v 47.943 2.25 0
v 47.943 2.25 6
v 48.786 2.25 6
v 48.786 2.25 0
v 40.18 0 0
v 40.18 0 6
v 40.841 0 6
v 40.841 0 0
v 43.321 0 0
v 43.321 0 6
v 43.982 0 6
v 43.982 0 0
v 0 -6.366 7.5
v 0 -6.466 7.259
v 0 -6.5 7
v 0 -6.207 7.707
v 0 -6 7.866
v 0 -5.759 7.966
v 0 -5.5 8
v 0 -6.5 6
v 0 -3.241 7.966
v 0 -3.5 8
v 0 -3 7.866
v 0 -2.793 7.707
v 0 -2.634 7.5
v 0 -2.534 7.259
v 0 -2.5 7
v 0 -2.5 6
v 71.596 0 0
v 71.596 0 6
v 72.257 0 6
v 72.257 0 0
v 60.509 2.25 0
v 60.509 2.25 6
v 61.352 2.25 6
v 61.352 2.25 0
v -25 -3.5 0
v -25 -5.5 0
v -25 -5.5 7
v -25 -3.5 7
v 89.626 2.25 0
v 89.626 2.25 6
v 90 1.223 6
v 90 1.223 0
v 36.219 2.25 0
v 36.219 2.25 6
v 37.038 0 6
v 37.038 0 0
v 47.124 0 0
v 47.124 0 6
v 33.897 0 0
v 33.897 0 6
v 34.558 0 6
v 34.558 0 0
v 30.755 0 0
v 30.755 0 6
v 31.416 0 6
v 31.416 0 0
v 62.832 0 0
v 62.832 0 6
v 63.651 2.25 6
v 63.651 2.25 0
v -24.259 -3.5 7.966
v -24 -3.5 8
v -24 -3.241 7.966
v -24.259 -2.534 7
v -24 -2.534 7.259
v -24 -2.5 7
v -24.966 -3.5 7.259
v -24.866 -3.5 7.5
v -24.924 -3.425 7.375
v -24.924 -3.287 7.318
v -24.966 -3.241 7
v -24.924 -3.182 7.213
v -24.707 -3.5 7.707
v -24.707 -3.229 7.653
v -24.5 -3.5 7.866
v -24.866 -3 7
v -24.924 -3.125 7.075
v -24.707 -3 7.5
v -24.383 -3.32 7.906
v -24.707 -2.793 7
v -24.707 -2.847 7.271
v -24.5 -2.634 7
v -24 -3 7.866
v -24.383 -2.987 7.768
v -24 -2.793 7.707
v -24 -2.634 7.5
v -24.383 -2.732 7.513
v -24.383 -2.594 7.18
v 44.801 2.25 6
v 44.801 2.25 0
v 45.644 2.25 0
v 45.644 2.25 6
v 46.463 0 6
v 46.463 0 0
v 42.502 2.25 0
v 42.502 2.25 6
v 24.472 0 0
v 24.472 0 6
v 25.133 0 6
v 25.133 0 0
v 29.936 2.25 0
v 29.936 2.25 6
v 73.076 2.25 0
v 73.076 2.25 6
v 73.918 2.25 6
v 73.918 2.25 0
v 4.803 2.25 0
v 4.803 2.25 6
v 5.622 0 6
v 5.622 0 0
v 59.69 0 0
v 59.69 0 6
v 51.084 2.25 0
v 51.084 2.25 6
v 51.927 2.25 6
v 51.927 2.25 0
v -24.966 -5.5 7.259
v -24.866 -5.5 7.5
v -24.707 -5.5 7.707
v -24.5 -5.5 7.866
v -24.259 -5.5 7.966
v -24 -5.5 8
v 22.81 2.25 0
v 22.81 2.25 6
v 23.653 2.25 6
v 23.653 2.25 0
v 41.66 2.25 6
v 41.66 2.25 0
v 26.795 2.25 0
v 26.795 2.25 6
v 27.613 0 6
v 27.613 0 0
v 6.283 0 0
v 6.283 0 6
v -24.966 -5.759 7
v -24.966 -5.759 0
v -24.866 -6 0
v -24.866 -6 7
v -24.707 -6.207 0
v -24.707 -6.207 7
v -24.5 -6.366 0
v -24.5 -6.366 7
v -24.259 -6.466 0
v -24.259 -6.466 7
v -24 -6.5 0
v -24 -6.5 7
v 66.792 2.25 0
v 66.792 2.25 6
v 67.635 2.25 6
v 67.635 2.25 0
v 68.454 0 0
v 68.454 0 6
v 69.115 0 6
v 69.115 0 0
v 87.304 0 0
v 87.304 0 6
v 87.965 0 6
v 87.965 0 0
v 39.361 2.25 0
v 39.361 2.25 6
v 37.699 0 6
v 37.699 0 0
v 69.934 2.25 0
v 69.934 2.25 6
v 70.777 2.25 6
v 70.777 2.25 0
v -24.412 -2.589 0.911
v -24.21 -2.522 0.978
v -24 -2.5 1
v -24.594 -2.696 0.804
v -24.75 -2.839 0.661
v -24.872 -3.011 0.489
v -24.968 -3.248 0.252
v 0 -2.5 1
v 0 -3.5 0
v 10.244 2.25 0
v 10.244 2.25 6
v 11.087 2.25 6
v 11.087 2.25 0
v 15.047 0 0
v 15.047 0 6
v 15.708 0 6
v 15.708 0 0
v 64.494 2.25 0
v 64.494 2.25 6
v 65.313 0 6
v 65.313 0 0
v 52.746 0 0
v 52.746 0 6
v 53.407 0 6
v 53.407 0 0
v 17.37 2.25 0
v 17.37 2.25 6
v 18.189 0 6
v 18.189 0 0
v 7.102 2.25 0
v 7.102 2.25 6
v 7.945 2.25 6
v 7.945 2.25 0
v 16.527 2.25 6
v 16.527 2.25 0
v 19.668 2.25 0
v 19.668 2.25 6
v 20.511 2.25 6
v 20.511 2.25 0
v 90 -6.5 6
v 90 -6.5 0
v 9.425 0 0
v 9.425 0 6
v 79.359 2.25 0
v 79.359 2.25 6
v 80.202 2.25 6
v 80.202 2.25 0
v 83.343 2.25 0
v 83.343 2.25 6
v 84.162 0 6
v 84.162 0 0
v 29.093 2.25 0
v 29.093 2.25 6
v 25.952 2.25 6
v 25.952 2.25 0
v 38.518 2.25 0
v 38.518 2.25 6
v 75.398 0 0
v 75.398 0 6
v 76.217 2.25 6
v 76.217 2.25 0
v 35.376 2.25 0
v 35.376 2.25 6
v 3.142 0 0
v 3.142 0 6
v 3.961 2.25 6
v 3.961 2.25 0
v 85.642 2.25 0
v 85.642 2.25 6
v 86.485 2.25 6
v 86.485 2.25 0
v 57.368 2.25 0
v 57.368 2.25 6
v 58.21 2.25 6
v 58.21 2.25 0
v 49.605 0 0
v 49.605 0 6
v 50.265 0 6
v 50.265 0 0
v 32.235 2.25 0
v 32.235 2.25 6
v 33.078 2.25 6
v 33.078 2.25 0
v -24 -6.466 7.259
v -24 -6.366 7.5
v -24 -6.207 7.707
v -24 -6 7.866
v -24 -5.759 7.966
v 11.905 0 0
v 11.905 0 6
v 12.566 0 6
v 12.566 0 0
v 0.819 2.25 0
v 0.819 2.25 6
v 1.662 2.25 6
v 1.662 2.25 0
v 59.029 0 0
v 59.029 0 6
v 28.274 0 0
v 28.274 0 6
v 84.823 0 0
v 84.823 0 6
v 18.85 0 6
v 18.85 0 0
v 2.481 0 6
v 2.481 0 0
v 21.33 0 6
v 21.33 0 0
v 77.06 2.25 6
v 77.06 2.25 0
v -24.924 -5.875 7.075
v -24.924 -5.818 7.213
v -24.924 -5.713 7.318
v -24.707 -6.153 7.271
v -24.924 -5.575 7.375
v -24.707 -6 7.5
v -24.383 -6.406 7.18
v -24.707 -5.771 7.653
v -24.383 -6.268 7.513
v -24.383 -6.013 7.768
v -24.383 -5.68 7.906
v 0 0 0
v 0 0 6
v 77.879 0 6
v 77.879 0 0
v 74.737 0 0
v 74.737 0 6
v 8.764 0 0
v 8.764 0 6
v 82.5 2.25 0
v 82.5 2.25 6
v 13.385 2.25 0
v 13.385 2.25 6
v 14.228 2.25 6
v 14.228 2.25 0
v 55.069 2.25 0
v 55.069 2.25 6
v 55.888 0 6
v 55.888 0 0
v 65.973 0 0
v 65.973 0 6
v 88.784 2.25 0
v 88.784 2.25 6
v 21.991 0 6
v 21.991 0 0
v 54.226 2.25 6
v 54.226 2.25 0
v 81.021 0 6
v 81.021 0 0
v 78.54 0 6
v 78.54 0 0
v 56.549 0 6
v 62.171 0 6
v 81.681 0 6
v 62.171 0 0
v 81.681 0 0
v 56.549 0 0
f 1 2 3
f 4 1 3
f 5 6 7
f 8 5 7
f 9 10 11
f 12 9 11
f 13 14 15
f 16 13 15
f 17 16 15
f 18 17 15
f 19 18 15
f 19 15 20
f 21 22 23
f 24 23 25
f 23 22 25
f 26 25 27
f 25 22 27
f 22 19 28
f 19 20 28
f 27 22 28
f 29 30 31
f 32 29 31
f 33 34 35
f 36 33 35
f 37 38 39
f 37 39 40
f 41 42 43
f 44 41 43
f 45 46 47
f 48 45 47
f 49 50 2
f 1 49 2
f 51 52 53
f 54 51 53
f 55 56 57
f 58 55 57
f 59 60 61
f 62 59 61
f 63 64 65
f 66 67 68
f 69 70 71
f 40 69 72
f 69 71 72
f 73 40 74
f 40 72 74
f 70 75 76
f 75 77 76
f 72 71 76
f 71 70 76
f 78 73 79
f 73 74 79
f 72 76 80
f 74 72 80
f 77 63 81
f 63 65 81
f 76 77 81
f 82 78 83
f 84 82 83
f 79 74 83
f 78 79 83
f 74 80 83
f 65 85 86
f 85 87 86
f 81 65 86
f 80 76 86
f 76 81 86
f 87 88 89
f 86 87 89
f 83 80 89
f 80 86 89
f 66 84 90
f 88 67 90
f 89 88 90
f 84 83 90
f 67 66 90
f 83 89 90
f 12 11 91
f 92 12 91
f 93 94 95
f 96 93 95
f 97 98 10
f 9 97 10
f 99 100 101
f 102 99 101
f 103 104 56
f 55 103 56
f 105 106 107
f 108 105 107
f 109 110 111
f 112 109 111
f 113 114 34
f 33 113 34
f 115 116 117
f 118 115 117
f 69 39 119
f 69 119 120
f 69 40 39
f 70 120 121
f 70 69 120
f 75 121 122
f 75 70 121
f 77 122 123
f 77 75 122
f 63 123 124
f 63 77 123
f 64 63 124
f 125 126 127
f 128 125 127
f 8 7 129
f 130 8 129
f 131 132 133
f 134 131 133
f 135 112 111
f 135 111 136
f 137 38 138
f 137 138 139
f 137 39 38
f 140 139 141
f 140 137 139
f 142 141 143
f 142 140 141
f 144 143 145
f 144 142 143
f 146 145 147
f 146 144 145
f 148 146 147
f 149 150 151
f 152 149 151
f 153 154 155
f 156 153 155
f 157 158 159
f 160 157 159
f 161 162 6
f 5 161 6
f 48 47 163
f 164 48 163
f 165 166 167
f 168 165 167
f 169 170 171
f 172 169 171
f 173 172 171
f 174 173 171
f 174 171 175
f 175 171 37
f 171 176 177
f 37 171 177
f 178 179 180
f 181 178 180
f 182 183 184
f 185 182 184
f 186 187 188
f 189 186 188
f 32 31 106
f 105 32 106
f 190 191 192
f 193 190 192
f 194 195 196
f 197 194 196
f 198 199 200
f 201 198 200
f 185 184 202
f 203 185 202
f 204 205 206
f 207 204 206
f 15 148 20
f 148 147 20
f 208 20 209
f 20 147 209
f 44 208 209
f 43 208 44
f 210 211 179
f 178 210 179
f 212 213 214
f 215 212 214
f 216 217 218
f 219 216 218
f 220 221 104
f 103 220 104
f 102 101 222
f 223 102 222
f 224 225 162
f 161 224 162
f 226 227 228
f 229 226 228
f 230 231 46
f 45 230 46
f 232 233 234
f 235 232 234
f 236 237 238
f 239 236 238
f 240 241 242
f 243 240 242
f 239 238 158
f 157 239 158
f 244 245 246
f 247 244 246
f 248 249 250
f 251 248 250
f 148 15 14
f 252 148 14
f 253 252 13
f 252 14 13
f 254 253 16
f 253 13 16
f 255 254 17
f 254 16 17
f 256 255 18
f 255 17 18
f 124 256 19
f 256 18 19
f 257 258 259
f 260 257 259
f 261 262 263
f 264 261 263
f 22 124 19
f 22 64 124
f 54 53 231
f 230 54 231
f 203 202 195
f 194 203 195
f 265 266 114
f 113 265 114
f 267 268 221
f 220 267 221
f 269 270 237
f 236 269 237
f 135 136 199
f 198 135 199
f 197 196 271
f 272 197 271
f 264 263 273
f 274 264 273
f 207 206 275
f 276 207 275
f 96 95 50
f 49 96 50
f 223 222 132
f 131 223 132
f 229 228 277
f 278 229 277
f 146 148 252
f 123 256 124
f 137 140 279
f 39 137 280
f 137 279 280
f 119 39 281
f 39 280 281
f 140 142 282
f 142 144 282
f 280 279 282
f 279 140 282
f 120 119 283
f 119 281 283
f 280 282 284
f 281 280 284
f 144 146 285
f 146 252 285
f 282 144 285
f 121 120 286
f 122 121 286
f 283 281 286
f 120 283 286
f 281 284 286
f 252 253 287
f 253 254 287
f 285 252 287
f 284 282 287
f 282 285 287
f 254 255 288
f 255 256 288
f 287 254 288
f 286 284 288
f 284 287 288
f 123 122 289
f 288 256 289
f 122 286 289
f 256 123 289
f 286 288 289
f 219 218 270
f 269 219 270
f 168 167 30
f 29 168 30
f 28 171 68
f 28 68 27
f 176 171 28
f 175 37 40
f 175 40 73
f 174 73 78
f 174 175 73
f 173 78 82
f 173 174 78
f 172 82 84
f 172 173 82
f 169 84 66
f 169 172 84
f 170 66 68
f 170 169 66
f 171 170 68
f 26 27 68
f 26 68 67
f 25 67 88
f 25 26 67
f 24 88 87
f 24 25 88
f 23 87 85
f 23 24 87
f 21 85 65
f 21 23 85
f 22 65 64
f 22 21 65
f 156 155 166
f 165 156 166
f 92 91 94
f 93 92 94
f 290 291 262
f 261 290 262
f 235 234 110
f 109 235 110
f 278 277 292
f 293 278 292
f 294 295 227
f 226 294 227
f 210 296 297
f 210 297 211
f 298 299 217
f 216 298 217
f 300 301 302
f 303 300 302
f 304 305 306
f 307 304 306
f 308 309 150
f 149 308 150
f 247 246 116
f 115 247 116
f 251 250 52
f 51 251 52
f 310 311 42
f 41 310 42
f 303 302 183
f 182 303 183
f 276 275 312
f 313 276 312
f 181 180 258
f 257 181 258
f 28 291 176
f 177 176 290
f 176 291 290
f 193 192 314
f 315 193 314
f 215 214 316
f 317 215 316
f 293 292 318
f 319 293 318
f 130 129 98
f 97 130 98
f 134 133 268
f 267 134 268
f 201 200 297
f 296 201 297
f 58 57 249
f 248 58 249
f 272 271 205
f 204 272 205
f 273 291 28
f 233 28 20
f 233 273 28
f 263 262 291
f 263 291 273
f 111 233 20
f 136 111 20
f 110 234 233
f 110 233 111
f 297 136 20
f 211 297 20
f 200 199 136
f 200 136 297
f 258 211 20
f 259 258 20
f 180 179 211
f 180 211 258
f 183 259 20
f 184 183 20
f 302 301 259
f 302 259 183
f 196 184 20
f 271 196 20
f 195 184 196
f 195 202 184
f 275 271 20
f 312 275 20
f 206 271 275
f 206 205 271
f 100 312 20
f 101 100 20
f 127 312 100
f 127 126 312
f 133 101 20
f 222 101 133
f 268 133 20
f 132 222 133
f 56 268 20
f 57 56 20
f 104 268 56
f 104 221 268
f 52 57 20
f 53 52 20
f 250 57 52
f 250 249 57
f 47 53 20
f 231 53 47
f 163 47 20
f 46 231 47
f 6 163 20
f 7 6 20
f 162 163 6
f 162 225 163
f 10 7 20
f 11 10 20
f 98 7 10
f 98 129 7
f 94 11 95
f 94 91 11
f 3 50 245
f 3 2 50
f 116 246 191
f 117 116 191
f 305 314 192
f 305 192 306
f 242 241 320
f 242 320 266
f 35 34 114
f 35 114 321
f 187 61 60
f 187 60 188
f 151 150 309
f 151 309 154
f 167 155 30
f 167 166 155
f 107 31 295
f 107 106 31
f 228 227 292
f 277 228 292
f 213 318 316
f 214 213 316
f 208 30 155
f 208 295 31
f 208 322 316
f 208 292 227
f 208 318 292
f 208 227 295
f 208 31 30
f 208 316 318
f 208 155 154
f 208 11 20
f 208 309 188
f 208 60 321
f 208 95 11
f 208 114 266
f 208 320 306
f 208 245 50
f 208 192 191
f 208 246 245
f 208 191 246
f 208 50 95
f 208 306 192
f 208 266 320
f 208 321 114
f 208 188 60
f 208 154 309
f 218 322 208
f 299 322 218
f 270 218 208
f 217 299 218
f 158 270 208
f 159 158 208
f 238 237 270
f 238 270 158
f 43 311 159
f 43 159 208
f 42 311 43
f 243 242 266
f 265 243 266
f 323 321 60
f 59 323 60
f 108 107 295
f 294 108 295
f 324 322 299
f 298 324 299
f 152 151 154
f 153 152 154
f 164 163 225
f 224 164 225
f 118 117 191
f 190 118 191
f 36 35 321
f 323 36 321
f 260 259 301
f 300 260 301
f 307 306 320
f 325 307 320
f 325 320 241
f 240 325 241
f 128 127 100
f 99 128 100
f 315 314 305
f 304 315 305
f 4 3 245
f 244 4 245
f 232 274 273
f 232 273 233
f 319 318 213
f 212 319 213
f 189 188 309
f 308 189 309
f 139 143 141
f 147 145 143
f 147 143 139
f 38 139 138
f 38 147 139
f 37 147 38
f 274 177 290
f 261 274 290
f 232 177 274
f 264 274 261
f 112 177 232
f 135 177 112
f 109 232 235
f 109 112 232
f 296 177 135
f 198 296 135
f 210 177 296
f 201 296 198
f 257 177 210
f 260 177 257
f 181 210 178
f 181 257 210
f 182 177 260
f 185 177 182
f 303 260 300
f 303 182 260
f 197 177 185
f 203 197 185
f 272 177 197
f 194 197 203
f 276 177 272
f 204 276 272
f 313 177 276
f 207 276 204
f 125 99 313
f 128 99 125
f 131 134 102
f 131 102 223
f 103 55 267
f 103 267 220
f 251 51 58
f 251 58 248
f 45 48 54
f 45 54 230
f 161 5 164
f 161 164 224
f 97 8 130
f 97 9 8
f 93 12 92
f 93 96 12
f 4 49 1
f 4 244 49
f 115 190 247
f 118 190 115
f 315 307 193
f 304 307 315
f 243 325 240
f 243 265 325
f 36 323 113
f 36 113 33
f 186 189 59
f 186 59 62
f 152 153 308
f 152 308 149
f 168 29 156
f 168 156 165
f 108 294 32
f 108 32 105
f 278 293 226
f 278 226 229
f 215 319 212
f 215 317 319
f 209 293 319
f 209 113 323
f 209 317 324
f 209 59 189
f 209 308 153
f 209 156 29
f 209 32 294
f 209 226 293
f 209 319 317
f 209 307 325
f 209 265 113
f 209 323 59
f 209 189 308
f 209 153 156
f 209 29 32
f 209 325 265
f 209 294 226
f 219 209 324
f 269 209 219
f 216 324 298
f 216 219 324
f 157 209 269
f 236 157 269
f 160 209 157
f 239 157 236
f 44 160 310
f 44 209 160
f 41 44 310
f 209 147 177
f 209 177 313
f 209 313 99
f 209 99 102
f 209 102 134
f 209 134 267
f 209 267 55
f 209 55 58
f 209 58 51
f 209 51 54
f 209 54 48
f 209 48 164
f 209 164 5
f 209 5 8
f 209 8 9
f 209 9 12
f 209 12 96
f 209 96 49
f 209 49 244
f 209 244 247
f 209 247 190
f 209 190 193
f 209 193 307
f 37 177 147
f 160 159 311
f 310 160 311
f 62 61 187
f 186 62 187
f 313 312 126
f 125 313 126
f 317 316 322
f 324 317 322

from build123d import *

# Parameters (mm, degrees)
SKETCH_1_W             = 135.088484104
SKETCH_1_H             = 6.5
EXTRUDE_1_DEPTH        = 8
EXTRUDE_2_DEPTH        = 8
PATTERN_LINEAR_1_COUNT = 43
PATTERN_LINEAR_1_PITCH = 3.141592654
SKETCH_3_OUTSIDE_W     = 164.21
SKETCH_3_OUTSIDE_H     = 37.872
SKETCH_3_OUTSIDE_W_2   = 90
SKETCH_3_OUTSIDE_H_2   = 28.626420759
CUT_EXTRUDE_1_DEPTH    = 26
SKETCH_4_W             = 8
SKETCH_4_H             = 4
EXTRUDE_1_2_DEPTH      = 115
CUT_EXTRUDE_2_DEPTH    = 2
SKETCH_7_W             = 25
SKETCH_7_H             = 4
EXTRUDE_3_DEPTH        = 2
FILLET_1_R             = 1
FILLET_2_R             = 1
CHAMFER_1_SIZE         = 1


with BuildPart() as part:
    # 草图1 → Extrude 1 (new body)
    with BuildSketch(Plane.XY):
        with Locations((67.544242052, -3.25)):
            Rectangle(SKETCH_1_W, SKETCH_1_H)
    extrude(amount=EXTRUDE_1_DEPTH)

    # 草图2 → Extrude 2 (add)
    with BuildSketch(Plane.XY.offset(8)):
        Polygon((0, 0), (0.818933027, 2.25), (1.661788885, 2.25), (2.480721912, 0), align=None)
    extrude_2 = extrude(amount=-EXTRUDE_2_DEPTH)

    # 阵列(线性)1: Extrude 2 ×43
    with Locations(*[(i * PATTERN_LINEAR_1_PITCH, 0, 0) for i in range(1, PATTERN_LINEAR_1_COUNT)]):
        add(extrude_2)

    # 草图3 outside → 切除-拉伸1 (cut)
    with BuildSketch(Plane.XY.offset(8)):
        with Locations((67.544, -2.125)):
            Rectangle(SKETCH_3_OUTSIDE_W, SKETCH_3_OUTSIDE_H)
        with Locations((45, 7.81321038)):
            Rectangle(SKETCH_3_OUTSIDE_W_2, SKETCH_3_OUTSIDE_H_2, mode=Mode.SUBTRACT)
    extrude(amount=-CUT_EXTRUDE_1_DEPTH, mode=Mode.SUBTRACT)

    # 草图4 → Extrude 1 2 (add)
    with BuildSketch(Plane(origin=(90, 0, 0), x_dir=(0, 0, -1), z_dir=(1, 0, 0))):
        with Locations((-4, -4.5)):
            Rectangle(SKETCH_4_W, SKETCH_4_H)
    extrude(amount=-EXTRUDE_1_2_DEPTH)

    # 草图5 → 切除-拉伸2 (cut)
    with BuildSketch(Plane.XY.offset(8)):
        Polygon((0, 0), (0, -2.5), (-25, -2.5), (-25, -6.5), (90, -6.5), (90, 1.22349624), (89.626383186, 2.25), (88.783527328, 2.25), (87.964594301, 0), (87.303723559, 0), (86.484790532, 2.25), (85.641934674, 2.25), (84.823001647, 0), (84.162130906, 0), (83.343197879, 2.25), (82.50034202, 2.25), (81.681408993, 0), (81.020538252, 0), (80.201605225, 2.25), (79.358749367, 2.25), (78.53981634, 0), (77.878945599, 0), (77.060012572, 2.25), (76.217156713, 2.25), (75.398223686, 0), (74.737352945, 0), (73.918419918, 2.25), (73.07556406, 2.25), (72.256631033, 0), (71.595760291, 0), (70.776827264, 2.25), (69.933971406, 2.25), (69.115038379, 0), (68.454167638, 0), (67.635234611, 2.25), (66.792378752, 2.25), (65.973445725, 0), (65.312574984, 0), (64.493641957, 2.25), (63.650786099, 2.25), (62.831853072, 0), (62.170982331, 0), (61.352049304, 2.25), (60.509193445, 2.25), (59.690260418, 0), (59.029389677, 0), (58.21045665, 2.25), (57.367600792, 2.25), (56.548667765, 0), (55.887797023, 0), (55.068863996, 2.25), (54.226008138, 2.25), (53.407075111, 0), (52.74620437, 0), (51.927271343, 2.25), (51.084415485, 2.25), (50.265482457, 0), (49.604611716, 0), (48.785678689, 2.25), (47.942822831, 2.25), (47.123889804, 0), (46.463019063, 0), (45.644086036, 2.25), (44.801230177, 2.25), (43.98229715, 0), (43.321426409, 0), (42.502493382, 2.25), (41.659637524, 2.25), (40.840704497, 0), (40.179833756, 0), (39.360900728, 2.25), (38.51804487, 2.25), (37.699111843, 0), (37.038241102, 0), (36.219308075, 2.25), (35.376452217, 2.25), (34.557519189, 0), (33.896648448, 0), (33.077715421, 2.25), (32.234859563, 2.25), (31.415926536, 0), (30.755055795, 0), (29.936122768, 2.25), (29.093266909, 2.25), (28.274333882, 0), (27.613463141, 0), (26.794530114, 2.25), (25.951674256, 2.25), (25.132741229, 0), (24.471870488, 0), (23.65293746, 2.25), (22.810081602, 2.25), (21.991148575, 0), (21.330277834, 0), (20.511344807, 2.25), (19.668488949, 2.25), (18.849555922, 0), (18.18868518, 0), (17.369752153, 2.25), (16.526896295, 2.25), (15.707963268, 0), (15.047092527, 0), (14.2281595, 2.25), (13.385303641, 2.25), (12.566370614, 0), (11.905499873, 0), (11.086566846, 2.25), (10.243710988, 2.25), (9.424777961, 0), (8.76390722, 0), (7.944974193, 2.25), (7.102118334, 2.25), (6.283185307, 0), (5.622314566, 0), (4.803381539, 2.25), (3.960525681, 2.25), (3.141592654, 0), (2.480721912, 0), (1.661788885, 2.25), (0.818933027, 2.25), align=None)
    extrude(amount=-CUT_EXTRUDE_2_DEPTH, mode=Mode.SUBTRACT)

    # 草图7 → 凸台-拉伸3 (add)
    with BuildSketch(Plane.XY.offset(6)):
        with Locations((-12.5, -4.5)):
            Rectangle(SKETCH_7_W, SKETCH_7_H)
    extrude(amount=EXTRUDE_3_DEPTH)

    # 圆角1
    fillet_1_edges = [part.edges().sort_by_distance(p)[0] for p in [
        (-12.5, -2.5, 8),
        (-12.5, -6.5, 8),
    ]]
    fillet(fillet_1_edges, radius=FILLET_1_R)

    # 圆角2
    fillet_2_edges = [part.edges().sort_by_distance(p)[0] for p in [
        (-25, -4.5, 8),
        (-25, -2.5, 3.5),
        (-25, -2.792893219, 7.707106781),
        (-25, -6.207106781, 7.707106781),
        (-25, -6.5, 3.5),
    ]]
    fillet(fillet_2_edges, radius=FILLET_2_R)

    # 倒角1
    # the kernel refuses this chamfer: 1 mm, written as the material it takes off along each edge
    with BuildSketch(Plane(origin=(0, -2.5, 0), x_dir=(0, 0.027495876610586494, 0.9996219169112968), z_dir=(-1, 0, 0))) as chamfer_1_piece_1:
        Polygon((CHAMFER_1_SIZE * 0.999621916911, -CHAMFER_1_SIZE * 0.0274958766106), (-CHAMFER_1_SIZE * 0.0274958766106, -CHAMFER_1_SIZE * 0.999621916911), (0, 0), align=None)
    extrude(amount=26.571682988, mode=Mode.SUBTRACT)


solid = part.part
